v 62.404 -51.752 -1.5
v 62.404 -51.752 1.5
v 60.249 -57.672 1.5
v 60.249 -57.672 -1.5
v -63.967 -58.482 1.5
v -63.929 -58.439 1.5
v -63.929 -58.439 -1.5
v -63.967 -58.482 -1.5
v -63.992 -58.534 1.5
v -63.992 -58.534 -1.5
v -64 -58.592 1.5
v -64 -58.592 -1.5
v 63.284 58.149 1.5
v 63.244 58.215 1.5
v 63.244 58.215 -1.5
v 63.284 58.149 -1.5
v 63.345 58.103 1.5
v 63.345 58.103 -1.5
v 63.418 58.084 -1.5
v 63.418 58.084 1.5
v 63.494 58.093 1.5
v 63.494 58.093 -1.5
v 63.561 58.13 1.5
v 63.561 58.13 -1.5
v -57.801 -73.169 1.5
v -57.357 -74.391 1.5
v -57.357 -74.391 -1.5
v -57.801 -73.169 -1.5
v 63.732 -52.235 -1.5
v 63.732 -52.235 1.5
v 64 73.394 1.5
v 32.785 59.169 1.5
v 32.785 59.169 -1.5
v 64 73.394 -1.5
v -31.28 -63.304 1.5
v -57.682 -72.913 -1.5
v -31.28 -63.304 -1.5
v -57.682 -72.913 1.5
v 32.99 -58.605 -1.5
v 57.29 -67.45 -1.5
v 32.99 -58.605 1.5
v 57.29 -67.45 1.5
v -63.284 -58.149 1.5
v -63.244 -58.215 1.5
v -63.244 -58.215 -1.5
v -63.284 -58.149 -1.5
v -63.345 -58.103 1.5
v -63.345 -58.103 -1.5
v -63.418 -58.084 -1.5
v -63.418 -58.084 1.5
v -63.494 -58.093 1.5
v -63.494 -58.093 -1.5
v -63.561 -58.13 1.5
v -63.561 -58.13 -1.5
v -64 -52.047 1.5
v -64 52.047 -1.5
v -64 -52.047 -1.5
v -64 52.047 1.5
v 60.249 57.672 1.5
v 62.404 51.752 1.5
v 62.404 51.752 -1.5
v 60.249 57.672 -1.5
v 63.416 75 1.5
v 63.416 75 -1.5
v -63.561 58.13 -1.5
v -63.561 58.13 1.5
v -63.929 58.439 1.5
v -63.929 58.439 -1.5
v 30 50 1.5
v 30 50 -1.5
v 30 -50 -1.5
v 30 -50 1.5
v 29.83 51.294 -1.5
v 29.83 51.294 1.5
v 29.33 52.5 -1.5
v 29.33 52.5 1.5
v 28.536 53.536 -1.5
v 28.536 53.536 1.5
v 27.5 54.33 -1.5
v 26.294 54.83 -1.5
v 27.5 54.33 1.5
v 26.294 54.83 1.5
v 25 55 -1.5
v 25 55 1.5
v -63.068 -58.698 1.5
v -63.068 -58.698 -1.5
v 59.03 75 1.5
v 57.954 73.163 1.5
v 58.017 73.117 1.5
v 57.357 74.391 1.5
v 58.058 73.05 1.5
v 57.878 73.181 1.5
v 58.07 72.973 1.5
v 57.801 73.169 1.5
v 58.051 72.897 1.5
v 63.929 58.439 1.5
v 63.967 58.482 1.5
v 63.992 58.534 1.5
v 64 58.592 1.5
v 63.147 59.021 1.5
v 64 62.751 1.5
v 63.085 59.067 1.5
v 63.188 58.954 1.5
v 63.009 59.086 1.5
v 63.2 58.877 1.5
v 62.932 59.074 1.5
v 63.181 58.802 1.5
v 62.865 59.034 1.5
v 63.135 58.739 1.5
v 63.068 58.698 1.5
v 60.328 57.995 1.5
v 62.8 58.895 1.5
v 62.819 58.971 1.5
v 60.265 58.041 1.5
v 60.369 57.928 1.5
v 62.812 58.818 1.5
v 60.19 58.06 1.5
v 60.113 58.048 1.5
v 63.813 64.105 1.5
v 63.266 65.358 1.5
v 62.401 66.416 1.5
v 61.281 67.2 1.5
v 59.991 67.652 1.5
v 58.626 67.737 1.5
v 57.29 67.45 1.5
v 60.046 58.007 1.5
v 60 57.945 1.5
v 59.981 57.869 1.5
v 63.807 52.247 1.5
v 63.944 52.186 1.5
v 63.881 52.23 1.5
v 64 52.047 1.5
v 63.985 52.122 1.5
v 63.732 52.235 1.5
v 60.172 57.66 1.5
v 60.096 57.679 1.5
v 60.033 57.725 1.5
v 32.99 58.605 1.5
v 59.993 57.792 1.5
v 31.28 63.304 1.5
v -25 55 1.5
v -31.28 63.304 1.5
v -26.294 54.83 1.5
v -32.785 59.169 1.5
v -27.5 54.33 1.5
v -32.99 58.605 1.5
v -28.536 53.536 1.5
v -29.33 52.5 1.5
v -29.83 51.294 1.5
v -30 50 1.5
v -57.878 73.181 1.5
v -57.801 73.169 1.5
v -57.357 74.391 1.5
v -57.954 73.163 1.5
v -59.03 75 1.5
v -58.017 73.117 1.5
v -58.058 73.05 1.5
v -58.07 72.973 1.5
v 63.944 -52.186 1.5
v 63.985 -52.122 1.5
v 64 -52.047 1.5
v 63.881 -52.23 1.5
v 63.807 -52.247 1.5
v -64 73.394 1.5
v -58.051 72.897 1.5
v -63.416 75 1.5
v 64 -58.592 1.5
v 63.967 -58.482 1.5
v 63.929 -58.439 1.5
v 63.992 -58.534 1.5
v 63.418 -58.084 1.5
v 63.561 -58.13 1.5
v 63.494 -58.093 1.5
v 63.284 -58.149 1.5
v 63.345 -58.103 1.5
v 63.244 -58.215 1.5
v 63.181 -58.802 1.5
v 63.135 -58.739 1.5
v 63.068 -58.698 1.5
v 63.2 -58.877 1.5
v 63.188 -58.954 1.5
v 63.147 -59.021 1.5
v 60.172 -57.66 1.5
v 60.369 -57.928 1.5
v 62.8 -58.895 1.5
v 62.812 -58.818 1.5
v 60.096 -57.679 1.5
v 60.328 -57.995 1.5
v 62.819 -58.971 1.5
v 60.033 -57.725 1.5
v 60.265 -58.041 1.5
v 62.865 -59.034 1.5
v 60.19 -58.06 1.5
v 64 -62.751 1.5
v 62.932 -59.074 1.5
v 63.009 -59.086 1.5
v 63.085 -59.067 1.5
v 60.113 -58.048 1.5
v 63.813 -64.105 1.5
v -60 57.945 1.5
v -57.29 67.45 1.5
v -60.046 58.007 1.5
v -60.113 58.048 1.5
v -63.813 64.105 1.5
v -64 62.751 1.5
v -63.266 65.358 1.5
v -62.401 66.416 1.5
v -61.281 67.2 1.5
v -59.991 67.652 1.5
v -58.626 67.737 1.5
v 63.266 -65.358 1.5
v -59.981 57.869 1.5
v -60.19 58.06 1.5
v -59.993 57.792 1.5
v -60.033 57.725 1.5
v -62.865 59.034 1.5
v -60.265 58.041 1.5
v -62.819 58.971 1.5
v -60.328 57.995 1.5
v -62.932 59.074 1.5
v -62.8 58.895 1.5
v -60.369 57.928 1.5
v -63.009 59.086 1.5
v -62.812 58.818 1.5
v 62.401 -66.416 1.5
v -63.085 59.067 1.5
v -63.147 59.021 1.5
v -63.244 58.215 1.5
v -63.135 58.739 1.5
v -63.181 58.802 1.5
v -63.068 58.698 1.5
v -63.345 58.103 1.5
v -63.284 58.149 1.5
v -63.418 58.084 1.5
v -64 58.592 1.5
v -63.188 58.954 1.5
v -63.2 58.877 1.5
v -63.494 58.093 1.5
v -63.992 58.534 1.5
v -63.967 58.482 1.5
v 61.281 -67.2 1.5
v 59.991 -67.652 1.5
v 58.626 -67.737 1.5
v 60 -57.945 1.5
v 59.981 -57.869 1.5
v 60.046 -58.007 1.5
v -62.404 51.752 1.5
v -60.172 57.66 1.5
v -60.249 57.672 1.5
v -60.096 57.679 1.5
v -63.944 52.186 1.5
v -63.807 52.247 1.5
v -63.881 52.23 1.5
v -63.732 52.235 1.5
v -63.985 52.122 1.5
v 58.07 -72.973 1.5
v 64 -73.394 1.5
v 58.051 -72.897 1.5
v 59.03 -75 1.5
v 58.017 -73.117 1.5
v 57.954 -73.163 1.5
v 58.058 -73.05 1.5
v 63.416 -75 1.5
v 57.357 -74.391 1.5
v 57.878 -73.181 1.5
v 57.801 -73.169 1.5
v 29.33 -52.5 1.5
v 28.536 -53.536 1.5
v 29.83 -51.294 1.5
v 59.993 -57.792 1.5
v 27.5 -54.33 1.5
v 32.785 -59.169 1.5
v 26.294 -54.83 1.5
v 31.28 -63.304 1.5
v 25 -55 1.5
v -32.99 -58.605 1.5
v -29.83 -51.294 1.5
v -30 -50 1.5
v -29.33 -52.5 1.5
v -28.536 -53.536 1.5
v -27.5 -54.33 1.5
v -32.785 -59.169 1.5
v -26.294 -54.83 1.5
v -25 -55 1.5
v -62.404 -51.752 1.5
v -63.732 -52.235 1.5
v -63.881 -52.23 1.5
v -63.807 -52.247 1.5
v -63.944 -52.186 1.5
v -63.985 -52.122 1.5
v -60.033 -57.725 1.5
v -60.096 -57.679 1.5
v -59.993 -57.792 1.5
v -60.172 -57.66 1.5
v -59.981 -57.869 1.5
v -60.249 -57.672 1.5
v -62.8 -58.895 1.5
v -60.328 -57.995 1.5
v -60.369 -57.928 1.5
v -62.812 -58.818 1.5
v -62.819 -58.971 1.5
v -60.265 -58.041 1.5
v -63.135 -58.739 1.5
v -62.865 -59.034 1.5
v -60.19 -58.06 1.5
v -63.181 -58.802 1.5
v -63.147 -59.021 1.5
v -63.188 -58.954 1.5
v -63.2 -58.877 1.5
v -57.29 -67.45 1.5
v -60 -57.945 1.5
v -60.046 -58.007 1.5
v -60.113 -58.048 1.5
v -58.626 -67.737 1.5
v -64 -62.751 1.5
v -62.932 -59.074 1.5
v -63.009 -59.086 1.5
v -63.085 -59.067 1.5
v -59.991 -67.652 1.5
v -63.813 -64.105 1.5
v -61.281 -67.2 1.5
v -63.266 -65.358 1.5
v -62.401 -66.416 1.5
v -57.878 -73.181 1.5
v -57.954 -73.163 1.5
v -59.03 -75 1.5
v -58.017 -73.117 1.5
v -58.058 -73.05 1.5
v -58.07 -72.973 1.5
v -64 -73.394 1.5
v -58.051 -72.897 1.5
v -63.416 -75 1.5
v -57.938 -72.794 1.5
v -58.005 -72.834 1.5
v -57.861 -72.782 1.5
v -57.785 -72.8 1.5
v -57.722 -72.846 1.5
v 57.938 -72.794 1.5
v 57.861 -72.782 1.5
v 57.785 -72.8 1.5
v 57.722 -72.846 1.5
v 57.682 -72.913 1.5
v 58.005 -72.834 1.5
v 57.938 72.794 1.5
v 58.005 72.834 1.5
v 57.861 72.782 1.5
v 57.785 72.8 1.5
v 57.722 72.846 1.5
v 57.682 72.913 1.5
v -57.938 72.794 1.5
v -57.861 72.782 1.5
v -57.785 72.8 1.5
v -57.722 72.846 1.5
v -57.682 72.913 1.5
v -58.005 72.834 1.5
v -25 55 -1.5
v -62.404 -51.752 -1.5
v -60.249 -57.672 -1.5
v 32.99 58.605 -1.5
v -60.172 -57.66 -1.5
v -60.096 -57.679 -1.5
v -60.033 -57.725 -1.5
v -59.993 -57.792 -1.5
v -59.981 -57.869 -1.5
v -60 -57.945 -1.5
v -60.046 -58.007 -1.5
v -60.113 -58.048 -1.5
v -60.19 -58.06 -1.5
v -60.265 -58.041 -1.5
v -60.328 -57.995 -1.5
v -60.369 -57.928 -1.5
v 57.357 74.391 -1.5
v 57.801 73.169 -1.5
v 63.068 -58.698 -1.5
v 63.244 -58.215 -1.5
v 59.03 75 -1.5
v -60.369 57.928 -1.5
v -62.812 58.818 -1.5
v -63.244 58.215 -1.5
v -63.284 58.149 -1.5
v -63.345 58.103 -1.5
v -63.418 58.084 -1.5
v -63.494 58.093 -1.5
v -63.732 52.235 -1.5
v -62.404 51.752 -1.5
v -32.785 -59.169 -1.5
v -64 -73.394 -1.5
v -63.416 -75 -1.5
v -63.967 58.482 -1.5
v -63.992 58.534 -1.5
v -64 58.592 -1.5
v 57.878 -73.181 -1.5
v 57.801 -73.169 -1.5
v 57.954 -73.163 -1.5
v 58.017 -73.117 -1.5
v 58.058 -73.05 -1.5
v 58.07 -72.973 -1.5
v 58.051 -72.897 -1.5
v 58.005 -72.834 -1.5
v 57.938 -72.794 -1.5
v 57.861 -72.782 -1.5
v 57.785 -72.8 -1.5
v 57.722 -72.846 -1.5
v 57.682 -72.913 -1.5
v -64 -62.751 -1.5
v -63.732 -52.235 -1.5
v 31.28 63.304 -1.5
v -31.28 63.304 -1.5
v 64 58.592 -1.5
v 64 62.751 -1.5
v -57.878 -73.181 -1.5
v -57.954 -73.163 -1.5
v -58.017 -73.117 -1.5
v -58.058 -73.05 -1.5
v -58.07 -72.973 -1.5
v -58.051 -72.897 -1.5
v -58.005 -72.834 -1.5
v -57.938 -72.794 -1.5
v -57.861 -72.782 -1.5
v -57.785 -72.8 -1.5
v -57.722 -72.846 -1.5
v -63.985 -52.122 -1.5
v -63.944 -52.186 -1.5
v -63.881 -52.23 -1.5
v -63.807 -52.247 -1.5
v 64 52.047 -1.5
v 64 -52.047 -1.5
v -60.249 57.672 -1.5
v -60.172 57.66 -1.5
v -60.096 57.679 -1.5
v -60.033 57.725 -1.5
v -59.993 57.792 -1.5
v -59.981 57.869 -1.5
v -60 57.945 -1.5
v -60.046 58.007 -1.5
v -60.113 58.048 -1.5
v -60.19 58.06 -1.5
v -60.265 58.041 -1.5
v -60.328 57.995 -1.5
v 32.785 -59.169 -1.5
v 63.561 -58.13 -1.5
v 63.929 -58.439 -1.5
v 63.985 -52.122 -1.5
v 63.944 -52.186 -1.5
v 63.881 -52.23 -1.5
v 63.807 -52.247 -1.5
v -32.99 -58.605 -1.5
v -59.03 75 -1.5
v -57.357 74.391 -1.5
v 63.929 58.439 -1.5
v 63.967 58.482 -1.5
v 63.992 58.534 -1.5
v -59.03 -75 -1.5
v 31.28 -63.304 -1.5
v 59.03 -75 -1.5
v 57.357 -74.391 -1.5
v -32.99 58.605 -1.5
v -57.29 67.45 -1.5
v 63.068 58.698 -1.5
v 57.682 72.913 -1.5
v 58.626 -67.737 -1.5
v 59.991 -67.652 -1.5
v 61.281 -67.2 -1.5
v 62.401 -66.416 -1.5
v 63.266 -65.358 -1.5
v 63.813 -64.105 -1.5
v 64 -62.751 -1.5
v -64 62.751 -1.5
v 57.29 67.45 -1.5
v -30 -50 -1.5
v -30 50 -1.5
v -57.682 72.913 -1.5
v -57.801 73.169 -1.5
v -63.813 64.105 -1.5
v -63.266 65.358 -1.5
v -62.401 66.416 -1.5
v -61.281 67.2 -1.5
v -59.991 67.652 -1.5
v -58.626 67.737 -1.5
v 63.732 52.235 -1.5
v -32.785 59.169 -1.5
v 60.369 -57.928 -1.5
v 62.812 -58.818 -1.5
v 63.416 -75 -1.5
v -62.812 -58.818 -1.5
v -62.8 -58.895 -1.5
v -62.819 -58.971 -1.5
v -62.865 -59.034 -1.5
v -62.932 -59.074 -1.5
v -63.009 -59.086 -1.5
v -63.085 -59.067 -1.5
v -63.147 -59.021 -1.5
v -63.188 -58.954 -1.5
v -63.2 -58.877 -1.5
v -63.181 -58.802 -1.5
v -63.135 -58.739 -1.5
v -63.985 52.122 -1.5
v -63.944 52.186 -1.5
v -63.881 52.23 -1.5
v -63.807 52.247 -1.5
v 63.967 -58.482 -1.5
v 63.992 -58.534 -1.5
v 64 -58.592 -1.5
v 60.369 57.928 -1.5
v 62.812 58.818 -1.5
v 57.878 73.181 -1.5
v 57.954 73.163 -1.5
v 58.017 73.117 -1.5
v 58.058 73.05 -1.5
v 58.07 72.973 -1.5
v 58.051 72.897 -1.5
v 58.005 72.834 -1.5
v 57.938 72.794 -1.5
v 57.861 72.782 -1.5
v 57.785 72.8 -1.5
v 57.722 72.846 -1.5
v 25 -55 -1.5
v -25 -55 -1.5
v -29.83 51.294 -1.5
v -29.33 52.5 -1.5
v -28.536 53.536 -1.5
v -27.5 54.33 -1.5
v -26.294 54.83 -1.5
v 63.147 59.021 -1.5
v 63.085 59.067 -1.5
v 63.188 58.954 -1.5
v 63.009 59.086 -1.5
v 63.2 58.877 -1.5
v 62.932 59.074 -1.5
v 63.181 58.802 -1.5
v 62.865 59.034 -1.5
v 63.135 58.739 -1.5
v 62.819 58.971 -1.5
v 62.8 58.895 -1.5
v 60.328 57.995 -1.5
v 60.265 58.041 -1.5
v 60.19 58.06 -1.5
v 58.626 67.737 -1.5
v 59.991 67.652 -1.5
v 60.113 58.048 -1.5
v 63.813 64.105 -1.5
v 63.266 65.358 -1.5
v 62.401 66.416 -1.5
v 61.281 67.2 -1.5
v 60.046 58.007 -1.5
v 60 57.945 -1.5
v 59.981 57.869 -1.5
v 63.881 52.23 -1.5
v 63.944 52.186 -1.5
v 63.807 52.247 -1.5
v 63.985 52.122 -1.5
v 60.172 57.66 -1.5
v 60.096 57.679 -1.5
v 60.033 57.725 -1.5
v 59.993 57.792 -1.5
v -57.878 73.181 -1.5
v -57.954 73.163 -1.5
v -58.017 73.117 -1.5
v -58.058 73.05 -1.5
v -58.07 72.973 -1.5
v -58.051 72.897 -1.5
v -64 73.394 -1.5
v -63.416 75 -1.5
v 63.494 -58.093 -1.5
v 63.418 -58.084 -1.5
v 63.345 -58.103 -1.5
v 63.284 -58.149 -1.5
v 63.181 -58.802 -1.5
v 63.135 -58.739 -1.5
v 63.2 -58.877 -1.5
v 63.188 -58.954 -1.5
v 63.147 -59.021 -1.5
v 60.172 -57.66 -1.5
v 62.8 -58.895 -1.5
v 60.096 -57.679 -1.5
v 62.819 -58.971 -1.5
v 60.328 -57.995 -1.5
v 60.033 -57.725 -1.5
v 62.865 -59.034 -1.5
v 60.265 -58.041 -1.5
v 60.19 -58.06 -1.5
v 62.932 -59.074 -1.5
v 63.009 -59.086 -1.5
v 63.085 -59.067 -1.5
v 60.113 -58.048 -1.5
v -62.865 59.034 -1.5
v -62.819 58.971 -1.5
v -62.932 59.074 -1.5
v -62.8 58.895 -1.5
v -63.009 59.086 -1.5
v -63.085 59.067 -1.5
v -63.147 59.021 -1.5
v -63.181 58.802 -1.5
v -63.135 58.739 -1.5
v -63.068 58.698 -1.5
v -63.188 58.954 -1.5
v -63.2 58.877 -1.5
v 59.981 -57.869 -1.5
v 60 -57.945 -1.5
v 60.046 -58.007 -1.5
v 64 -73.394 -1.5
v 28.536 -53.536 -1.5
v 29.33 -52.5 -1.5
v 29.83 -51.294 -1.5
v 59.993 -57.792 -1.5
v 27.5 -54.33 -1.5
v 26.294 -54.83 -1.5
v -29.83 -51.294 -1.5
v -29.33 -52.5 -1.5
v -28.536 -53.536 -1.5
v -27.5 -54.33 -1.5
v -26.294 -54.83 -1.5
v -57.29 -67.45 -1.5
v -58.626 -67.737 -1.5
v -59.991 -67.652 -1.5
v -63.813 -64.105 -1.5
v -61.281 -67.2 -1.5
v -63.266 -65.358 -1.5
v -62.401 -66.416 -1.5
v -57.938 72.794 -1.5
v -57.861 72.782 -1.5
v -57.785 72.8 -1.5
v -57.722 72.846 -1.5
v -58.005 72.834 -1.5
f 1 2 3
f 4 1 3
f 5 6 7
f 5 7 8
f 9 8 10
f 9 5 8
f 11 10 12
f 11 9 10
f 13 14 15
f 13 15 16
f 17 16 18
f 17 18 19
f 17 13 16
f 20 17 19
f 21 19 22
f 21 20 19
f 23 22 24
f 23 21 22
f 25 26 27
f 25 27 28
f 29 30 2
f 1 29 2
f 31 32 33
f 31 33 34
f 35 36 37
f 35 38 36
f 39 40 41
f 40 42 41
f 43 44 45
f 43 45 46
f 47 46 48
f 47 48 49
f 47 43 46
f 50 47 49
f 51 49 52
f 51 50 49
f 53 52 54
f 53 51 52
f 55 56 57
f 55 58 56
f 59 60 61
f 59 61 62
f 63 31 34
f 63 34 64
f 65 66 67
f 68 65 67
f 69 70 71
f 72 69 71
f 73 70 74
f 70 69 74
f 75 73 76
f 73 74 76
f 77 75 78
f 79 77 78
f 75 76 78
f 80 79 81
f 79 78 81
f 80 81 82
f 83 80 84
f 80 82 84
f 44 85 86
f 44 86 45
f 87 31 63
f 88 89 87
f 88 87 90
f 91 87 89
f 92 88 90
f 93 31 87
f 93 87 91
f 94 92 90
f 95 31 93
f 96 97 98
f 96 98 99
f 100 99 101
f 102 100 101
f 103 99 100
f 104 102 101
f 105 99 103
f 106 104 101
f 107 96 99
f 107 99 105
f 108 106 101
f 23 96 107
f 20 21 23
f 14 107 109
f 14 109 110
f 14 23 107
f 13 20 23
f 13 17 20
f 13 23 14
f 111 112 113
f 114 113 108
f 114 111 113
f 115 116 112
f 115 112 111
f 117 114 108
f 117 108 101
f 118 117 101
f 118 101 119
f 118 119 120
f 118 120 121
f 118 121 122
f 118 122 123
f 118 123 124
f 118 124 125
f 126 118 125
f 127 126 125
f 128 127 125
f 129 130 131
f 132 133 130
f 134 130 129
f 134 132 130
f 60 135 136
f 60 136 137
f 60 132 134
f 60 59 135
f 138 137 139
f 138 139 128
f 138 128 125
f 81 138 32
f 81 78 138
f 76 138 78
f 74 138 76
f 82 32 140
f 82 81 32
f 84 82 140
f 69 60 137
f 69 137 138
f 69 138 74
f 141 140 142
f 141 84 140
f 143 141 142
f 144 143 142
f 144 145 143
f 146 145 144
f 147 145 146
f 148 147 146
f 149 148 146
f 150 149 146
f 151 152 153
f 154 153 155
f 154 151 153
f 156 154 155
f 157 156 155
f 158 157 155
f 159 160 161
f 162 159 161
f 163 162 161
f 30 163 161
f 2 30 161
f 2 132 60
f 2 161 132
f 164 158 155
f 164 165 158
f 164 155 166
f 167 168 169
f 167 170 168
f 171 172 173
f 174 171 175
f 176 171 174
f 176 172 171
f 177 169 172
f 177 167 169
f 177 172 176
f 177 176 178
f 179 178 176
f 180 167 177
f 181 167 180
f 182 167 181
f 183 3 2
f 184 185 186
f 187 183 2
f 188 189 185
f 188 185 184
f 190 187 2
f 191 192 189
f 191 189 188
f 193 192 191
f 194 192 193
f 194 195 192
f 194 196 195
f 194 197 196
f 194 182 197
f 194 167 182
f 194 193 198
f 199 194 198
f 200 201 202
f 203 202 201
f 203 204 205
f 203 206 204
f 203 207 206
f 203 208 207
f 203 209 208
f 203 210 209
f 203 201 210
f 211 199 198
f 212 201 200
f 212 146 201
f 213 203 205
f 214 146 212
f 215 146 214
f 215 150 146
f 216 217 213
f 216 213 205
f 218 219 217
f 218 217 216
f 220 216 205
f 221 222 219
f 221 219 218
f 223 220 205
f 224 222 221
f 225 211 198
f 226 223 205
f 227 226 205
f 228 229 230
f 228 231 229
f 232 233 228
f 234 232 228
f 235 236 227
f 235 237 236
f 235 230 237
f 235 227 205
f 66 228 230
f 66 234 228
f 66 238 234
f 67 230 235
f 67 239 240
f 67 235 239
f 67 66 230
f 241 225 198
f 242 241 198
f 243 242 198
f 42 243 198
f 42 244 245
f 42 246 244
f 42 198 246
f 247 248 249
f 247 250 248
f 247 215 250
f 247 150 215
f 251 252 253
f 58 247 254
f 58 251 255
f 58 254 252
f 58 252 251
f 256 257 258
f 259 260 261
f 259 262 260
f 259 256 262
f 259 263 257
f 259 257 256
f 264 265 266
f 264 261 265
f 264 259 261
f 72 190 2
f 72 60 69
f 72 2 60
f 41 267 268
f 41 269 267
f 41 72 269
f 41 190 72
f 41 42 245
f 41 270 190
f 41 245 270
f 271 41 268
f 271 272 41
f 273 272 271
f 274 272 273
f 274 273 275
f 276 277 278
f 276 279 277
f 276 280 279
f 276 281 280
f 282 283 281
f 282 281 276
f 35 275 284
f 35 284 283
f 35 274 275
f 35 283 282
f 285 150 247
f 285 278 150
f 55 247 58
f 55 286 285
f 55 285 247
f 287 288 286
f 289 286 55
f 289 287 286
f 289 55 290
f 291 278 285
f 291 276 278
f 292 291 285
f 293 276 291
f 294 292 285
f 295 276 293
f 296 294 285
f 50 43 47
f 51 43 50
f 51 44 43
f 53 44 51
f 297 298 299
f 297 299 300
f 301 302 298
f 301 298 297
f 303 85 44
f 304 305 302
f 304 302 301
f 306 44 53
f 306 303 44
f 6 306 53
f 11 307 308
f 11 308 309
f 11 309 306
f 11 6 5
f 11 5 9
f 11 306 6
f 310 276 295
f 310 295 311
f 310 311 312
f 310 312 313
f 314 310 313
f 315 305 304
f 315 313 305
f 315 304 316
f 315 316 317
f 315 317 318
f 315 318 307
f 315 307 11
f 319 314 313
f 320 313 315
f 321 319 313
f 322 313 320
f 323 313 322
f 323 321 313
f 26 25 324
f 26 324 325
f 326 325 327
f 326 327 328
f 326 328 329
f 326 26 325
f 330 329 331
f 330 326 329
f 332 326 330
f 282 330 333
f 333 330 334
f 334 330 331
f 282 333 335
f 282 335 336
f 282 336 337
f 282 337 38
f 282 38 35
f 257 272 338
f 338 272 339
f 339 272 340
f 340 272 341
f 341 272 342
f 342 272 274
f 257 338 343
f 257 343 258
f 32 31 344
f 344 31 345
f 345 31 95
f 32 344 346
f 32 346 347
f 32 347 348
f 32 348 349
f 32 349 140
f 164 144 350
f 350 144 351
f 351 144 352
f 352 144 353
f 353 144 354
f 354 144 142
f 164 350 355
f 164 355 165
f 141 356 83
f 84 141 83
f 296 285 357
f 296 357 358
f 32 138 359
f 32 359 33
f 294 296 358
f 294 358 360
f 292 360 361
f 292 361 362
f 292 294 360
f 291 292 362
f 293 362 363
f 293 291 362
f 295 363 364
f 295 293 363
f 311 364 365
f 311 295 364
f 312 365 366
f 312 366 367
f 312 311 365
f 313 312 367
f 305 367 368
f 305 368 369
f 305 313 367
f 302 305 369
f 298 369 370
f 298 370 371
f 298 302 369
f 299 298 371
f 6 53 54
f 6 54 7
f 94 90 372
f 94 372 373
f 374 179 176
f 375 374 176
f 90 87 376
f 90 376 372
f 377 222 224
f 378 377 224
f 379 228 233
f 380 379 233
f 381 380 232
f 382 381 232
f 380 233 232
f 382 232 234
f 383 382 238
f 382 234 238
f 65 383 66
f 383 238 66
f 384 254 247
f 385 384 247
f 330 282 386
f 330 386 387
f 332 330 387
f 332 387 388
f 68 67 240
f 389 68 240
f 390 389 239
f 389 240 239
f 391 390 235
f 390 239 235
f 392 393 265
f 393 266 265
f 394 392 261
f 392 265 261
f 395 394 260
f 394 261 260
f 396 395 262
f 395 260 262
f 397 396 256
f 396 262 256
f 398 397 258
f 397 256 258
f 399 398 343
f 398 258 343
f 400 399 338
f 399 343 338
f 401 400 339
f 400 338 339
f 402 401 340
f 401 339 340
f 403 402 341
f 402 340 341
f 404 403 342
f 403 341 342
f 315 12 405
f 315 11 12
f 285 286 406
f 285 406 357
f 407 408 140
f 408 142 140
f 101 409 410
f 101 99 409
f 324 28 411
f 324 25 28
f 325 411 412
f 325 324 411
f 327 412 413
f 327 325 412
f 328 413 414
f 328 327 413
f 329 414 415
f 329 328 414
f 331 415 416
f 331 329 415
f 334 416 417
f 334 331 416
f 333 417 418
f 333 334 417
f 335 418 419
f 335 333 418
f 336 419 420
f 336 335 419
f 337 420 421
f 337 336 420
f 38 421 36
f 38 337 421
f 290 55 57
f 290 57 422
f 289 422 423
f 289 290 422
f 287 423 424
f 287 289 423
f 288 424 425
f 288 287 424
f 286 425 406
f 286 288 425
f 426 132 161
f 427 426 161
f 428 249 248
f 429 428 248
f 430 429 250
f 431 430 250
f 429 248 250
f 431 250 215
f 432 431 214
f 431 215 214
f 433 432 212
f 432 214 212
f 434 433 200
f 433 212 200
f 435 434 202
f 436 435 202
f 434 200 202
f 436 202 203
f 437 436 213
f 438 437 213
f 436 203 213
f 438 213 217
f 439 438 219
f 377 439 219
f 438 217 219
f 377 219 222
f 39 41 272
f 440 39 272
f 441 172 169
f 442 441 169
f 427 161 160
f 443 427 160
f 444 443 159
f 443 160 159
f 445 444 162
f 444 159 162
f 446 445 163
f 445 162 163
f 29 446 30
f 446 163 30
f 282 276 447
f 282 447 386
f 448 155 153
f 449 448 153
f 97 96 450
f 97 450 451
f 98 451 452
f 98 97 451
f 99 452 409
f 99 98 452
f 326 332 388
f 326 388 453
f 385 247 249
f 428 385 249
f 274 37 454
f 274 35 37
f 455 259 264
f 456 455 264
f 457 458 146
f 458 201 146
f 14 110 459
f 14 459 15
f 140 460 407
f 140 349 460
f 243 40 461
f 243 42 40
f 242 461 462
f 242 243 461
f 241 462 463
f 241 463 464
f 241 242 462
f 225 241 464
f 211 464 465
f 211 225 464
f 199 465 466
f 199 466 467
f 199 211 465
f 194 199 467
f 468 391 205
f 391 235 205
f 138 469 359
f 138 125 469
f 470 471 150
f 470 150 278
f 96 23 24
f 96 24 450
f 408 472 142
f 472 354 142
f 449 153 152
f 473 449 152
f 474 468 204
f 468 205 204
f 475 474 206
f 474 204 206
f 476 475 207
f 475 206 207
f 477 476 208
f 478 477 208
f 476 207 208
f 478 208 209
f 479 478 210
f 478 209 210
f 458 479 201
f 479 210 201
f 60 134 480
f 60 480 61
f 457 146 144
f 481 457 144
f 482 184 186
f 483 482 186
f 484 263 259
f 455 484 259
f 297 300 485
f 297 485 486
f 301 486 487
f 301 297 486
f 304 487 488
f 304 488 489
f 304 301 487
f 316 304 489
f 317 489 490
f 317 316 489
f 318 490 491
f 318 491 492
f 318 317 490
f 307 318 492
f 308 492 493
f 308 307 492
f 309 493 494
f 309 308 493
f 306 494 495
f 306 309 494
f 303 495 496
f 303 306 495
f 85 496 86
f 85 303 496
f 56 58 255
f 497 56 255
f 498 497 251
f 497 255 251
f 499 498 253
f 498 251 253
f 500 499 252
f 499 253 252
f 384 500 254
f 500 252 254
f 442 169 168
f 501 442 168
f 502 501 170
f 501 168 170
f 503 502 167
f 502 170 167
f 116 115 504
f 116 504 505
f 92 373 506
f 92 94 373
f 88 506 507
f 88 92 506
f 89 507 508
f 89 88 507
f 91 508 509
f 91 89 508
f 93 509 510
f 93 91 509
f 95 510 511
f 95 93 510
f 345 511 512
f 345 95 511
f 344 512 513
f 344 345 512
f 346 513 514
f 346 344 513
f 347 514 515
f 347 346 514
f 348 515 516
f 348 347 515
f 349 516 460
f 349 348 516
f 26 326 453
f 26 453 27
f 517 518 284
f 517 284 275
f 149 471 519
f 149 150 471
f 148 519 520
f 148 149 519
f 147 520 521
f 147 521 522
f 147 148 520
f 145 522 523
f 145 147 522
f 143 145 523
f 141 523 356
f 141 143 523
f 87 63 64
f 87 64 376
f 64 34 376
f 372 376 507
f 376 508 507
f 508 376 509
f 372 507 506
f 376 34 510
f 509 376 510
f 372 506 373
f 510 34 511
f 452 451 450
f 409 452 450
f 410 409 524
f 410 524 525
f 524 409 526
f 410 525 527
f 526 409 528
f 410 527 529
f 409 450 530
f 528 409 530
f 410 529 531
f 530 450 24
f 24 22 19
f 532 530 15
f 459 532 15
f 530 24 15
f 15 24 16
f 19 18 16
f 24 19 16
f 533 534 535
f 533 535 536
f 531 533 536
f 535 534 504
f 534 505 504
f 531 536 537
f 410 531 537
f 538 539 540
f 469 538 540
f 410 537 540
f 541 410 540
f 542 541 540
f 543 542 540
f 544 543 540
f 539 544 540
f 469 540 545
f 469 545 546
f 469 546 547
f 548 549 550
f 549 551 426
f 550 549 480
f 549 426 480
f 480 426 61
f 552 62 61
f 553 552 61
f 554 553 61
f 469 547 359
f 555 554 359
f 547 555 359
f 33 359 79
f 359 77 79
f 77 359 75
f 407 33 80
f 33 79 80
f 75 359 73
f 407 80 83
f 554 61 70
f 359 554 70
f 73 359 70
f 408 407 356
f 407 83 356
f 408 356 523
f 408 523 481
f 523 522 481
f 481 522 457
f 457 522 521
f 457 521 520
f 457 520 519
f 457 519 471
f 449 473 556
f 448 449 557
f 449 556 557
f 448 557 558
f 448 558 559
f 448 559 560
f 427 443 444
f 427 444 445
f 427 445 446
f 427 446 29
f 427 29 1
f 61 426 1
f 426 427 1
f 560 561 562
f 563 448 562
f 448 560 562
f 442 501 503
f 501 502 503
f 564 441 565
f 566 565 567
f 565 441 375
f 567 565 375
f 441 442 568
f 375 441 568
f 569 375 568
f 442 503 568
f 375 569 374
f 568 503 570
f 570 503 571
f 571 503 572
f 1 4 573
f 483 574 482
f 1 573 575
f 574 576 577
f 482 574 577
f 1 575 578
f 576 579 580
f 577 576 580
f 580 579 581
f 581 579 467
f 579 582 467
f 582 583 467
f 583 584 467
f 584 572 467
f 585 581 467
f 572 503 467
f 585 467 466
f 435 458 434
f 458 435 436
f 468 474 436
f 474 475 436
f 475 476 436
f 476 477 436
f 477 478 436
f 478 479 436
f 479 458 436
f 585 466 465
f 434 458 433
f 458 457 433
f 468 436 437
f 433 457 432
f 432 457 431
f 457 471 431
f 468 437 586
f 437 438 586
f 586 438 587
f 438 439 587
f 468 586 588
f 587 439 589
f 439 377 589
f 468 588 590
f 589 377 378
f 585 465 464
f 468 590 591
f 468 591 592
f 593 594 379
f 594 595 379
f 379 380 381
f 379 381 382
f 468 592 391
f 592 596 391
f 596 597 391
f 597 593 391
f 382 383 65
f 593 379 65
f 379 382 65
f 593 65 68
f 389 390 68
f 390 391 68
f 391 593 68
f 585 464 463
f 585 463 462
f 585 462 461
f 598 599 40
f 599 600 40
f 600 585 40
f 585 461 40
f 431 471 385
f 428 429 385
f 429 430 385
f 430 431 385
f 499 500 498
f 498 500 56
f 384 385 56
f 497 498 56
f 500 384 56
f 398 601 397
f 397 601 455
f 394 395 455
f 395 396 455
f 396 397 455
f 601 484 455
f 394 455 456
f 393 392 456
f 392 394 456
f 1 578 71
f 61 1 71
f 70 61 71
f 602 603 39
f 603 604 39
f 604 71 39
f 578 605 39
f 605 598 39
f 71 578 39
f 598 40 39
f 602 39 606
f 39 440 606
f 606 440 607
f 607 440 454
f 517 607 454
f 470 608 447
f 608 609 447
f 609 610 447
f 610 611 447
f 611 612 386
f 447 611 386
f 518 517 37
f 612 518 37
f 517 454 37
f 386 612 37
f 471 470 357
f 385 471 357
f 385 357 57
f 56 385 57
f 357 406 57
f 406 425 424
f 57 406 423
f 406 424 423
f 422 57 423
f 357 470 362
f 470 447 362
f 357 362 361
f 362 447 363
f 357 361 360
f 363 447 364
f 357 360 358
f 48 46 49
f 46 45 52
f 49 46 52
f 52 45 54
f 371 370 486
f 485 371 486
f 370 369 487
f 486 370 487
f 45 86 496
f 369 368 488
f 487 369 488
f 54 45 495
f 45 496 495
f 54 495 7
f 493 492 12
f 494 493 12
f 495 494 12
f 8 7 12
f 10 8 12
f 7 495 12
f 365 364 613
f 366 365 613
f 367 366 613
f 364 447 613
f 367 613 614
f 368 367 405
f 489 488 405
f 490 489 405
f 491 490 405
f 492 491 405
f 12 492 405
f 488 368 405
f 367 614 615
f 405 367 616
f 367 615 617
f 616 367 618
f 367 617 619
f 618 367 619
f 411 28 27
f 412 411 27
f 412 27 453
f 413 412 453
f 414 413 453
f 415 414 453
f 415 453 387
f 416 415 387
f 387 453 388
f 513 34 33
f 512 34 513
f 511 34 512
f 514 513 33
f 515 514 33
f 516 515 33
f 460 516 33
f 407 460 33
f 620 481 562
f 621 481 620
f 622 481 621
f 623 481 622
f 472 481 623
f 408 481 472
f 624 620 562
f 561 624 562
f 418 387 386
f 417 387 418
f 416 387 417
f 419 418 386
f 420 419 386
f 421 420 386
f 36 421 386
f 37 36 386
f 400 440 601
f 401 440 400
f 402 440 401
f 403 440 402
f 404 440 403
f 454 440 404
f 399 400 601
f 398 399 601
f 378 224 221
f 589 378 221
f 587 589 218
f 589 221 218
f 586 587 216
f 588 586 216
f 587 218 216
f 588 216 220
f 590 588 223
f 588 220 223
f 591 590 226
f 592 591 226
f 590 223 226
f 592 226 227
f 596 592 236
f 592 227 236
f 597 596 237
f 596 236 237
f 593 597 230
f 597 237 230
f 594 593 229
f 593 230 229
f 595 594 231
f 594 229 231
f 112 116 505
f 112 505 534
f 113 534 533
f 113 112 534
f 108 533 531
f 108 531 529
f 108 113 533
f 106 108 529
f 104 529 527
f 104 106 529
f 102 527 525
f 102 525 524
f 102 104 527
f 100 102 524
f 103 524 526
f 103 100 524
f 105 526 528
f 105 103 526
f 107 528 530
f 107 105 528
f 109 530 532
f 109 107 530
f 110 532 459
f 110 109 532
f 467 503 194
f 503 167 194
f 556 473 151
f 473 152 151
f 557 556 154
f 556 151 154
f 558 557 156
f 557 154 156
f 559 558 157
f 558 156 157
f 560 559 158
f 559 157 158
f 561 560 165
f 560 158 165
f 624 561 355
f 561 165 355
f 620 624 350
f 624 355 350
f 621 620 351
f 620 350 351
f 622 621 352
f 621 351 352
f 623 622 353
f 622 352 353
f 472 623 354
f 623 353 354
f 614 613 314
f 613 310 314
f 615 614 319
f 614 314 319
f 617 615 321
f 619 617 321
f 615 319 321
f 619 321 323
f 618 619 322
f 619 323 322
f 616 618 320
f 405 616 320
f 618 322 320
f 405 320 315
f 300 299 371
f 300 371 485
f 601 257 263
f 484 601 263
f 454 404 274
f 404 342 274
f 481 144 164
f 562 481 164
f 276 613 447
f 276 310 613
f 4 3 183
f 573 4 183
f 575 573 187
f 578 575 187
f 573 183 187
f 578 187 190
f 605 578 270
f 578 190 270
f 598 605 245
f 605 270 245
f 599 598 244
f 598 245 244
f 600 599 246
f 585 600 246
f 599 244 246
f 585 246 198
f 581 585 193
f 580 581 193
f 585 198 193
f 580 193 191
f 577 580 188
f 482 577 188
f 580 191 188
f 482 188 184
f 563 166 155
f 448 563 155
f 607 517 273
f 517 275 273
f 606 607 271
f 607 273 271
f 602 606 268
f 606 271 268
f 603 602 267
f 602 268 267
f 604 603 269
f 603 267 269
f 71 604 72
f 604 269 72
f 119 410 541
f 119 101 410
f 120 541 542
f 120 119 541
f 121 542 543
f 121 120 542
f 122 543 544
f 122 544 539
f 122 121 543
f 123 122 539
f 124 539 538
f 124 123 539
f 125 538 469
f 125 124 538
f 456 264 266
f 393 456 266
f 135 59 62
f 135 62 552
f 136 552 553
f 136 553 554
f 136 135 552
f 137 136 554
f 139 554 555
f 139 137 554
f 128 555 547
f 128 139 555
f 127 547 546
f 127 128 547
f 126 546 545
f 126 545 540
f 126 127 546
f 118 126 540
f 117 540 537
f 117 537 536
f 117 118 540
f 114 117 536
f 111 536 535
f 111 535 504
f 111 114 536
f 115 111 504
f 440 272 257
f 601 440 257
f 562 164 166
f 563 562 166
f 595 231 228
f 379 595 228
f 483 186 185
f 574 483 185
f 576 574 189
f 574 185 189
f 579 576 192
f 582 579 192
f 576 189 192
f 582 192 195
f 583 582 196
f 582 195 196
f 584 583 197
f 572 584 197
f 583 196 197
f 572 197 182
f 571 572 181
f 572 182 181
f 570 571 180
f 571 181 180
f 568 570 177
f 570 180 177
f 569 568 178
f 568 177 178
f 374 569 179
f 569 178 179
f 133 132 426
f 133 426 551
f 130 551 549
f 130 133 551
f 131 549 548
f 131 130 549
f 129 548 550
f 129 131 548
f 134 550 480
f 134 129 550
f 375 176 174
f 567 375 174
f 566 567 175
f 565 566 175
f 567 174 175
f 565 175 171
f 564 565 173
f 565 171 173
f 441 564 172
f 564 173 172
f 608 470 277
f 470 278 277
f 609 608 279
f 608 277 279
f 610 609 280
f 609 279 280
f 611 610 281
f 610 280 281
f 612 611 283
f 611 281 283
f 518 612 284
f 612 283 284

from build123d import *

# Parameters (mm, degrees)
F1_DEPTH = 1.5
F4_W     = 60
F4_H     = 110
F5_DEPTH = 3
F6_R     = 5
F7_R     = 5


# Not quite as in the source:
# - a feature names something its author has since deleted; it is built from what else it names


with BuildPart() as f1:
    # F0 (on Top) → F1 (new body, symmetric)
    with BuildSketch(Plane.XY):
        with BuildLine():
            Line((31.2800427974, 63.3035998776), (0, 63.3035998776))
            Line((0, 63.3035998776), (0, 0))
            Line((0, 0), (64, 0))
            Line((64, 0), (64, 52.0472386562))
            ThreePointArc((64, 52.0472386562), (63.9147152873, 52.211069065), (63.7315959713, 52.2351771803))
            Line((63.7315959713, 52.2351771803), (62.4040530693, 51.7519910793))
            Line((62.4040530693, 51.7519910793), (60.2493261663, 57.6720545902))
            ThreePointArc((60.2493261663, 57.6720545902), (59.9996605802, 57.9445167667), (60.3688606618, 57.9283971431))
            Line((60.3688606618, 57.9283971431), (62.8120614758, 58.8176495157))
            ThreePointArc((62.8120614758, 58.8176495157), (63.0845236523, 59.0673151018), (63.0684040287, 58.6981150202))
            Line((63.0684040287, 58.6981150202), (63.2443290661, 58.2147649522))
            ThreePointArc((63.2443290661, 58.2147649522), (63.3805037813, 58.0899838157), (63.5608251122, 58.1299600923))
            Line((63.5608251122, 58.1299600923), (63.9285575219, 58.4385242216))
            ThreePointArc((63.9285575219, 58.4385242216), (63.9812615574, 58.5072094579), (64, 58.5917331103))
            Line((64, 58.5917331103), (64, 69.8918015034))
            Line((64, 69.8918015034), (32.9901435141, 58.6051367736))
            Line((32.9901435141, 58.6051367736), (32.7849314281, 59.1689523461))
            Line((32.7849314281, 59.1689523461), (64, 73.3944786626))
            Line((64, 73.3944786626), (63.4156380227, 75))
            Line((63.4156380227, 75), (59.0299314225, 75))
            Line((59.0299314225, 75), (57.3566676351, 74.3909817873))
            Line((57.3566676351, 74.3909817873), (57.8012938214, 73.1693813803))
            ThreePointArc((57.8012938214, 73.1693813803), (58.0509594075, 72.8969192038), (57.681759326, 72.9130388275))
            Line((57.681759326, 72.9130388275), (31.2800427974, 63.3035998776))
        make_face()
    extrude(amount=F1_DEPTH, both=True)

    # F2: F1 across face


with BuildPart() as f1_1:
    add(f1.part)
    add(f1.part.mirror(Plane(origin=(0, 31.6517999388, 0), x_dir=(0, -1, 0), z_dir=(-1, 0, 0))))

    # F3: F1 across face


with BuildPart() as f1_2:
    add(f1_1.part)
    add(f1_1.part.mirror(Plane.XZ))

    # F4 (on face) → F5 (cut, through all)
    with BuildSketch(Plane(origin=(0, 0, -1.5), x_dir=(1, 0, 0), z_dir=(0, 0, -1))):
        Rectangle(F4_W, F4_H)
    extrude(amount=-F5_DEPTH, mode=Mode.SUBTRACT)

    # F6
    f6_edges = [f1_2.edges().sort_by_distance(p)[0] for p in [
        (-64, -69.891802, 0),
        (64, -69.891802, 0),
        (64, 69.891802, 0),
        (-64, 69.891802, 0),
    ]]
    fillet(f6_edges, radius=F6_R)

    # F7
    f7_edges = [f1_2.edges().sort_by_distance(p)[0] for p in [
        (-30, 55, 0),
        (-30, -55, 0),
        (30, -55, 0),
        (30, 55, 0),
    ]]
    fillet(f7_edges, radius=F7_R)


solid = f1_2.part
